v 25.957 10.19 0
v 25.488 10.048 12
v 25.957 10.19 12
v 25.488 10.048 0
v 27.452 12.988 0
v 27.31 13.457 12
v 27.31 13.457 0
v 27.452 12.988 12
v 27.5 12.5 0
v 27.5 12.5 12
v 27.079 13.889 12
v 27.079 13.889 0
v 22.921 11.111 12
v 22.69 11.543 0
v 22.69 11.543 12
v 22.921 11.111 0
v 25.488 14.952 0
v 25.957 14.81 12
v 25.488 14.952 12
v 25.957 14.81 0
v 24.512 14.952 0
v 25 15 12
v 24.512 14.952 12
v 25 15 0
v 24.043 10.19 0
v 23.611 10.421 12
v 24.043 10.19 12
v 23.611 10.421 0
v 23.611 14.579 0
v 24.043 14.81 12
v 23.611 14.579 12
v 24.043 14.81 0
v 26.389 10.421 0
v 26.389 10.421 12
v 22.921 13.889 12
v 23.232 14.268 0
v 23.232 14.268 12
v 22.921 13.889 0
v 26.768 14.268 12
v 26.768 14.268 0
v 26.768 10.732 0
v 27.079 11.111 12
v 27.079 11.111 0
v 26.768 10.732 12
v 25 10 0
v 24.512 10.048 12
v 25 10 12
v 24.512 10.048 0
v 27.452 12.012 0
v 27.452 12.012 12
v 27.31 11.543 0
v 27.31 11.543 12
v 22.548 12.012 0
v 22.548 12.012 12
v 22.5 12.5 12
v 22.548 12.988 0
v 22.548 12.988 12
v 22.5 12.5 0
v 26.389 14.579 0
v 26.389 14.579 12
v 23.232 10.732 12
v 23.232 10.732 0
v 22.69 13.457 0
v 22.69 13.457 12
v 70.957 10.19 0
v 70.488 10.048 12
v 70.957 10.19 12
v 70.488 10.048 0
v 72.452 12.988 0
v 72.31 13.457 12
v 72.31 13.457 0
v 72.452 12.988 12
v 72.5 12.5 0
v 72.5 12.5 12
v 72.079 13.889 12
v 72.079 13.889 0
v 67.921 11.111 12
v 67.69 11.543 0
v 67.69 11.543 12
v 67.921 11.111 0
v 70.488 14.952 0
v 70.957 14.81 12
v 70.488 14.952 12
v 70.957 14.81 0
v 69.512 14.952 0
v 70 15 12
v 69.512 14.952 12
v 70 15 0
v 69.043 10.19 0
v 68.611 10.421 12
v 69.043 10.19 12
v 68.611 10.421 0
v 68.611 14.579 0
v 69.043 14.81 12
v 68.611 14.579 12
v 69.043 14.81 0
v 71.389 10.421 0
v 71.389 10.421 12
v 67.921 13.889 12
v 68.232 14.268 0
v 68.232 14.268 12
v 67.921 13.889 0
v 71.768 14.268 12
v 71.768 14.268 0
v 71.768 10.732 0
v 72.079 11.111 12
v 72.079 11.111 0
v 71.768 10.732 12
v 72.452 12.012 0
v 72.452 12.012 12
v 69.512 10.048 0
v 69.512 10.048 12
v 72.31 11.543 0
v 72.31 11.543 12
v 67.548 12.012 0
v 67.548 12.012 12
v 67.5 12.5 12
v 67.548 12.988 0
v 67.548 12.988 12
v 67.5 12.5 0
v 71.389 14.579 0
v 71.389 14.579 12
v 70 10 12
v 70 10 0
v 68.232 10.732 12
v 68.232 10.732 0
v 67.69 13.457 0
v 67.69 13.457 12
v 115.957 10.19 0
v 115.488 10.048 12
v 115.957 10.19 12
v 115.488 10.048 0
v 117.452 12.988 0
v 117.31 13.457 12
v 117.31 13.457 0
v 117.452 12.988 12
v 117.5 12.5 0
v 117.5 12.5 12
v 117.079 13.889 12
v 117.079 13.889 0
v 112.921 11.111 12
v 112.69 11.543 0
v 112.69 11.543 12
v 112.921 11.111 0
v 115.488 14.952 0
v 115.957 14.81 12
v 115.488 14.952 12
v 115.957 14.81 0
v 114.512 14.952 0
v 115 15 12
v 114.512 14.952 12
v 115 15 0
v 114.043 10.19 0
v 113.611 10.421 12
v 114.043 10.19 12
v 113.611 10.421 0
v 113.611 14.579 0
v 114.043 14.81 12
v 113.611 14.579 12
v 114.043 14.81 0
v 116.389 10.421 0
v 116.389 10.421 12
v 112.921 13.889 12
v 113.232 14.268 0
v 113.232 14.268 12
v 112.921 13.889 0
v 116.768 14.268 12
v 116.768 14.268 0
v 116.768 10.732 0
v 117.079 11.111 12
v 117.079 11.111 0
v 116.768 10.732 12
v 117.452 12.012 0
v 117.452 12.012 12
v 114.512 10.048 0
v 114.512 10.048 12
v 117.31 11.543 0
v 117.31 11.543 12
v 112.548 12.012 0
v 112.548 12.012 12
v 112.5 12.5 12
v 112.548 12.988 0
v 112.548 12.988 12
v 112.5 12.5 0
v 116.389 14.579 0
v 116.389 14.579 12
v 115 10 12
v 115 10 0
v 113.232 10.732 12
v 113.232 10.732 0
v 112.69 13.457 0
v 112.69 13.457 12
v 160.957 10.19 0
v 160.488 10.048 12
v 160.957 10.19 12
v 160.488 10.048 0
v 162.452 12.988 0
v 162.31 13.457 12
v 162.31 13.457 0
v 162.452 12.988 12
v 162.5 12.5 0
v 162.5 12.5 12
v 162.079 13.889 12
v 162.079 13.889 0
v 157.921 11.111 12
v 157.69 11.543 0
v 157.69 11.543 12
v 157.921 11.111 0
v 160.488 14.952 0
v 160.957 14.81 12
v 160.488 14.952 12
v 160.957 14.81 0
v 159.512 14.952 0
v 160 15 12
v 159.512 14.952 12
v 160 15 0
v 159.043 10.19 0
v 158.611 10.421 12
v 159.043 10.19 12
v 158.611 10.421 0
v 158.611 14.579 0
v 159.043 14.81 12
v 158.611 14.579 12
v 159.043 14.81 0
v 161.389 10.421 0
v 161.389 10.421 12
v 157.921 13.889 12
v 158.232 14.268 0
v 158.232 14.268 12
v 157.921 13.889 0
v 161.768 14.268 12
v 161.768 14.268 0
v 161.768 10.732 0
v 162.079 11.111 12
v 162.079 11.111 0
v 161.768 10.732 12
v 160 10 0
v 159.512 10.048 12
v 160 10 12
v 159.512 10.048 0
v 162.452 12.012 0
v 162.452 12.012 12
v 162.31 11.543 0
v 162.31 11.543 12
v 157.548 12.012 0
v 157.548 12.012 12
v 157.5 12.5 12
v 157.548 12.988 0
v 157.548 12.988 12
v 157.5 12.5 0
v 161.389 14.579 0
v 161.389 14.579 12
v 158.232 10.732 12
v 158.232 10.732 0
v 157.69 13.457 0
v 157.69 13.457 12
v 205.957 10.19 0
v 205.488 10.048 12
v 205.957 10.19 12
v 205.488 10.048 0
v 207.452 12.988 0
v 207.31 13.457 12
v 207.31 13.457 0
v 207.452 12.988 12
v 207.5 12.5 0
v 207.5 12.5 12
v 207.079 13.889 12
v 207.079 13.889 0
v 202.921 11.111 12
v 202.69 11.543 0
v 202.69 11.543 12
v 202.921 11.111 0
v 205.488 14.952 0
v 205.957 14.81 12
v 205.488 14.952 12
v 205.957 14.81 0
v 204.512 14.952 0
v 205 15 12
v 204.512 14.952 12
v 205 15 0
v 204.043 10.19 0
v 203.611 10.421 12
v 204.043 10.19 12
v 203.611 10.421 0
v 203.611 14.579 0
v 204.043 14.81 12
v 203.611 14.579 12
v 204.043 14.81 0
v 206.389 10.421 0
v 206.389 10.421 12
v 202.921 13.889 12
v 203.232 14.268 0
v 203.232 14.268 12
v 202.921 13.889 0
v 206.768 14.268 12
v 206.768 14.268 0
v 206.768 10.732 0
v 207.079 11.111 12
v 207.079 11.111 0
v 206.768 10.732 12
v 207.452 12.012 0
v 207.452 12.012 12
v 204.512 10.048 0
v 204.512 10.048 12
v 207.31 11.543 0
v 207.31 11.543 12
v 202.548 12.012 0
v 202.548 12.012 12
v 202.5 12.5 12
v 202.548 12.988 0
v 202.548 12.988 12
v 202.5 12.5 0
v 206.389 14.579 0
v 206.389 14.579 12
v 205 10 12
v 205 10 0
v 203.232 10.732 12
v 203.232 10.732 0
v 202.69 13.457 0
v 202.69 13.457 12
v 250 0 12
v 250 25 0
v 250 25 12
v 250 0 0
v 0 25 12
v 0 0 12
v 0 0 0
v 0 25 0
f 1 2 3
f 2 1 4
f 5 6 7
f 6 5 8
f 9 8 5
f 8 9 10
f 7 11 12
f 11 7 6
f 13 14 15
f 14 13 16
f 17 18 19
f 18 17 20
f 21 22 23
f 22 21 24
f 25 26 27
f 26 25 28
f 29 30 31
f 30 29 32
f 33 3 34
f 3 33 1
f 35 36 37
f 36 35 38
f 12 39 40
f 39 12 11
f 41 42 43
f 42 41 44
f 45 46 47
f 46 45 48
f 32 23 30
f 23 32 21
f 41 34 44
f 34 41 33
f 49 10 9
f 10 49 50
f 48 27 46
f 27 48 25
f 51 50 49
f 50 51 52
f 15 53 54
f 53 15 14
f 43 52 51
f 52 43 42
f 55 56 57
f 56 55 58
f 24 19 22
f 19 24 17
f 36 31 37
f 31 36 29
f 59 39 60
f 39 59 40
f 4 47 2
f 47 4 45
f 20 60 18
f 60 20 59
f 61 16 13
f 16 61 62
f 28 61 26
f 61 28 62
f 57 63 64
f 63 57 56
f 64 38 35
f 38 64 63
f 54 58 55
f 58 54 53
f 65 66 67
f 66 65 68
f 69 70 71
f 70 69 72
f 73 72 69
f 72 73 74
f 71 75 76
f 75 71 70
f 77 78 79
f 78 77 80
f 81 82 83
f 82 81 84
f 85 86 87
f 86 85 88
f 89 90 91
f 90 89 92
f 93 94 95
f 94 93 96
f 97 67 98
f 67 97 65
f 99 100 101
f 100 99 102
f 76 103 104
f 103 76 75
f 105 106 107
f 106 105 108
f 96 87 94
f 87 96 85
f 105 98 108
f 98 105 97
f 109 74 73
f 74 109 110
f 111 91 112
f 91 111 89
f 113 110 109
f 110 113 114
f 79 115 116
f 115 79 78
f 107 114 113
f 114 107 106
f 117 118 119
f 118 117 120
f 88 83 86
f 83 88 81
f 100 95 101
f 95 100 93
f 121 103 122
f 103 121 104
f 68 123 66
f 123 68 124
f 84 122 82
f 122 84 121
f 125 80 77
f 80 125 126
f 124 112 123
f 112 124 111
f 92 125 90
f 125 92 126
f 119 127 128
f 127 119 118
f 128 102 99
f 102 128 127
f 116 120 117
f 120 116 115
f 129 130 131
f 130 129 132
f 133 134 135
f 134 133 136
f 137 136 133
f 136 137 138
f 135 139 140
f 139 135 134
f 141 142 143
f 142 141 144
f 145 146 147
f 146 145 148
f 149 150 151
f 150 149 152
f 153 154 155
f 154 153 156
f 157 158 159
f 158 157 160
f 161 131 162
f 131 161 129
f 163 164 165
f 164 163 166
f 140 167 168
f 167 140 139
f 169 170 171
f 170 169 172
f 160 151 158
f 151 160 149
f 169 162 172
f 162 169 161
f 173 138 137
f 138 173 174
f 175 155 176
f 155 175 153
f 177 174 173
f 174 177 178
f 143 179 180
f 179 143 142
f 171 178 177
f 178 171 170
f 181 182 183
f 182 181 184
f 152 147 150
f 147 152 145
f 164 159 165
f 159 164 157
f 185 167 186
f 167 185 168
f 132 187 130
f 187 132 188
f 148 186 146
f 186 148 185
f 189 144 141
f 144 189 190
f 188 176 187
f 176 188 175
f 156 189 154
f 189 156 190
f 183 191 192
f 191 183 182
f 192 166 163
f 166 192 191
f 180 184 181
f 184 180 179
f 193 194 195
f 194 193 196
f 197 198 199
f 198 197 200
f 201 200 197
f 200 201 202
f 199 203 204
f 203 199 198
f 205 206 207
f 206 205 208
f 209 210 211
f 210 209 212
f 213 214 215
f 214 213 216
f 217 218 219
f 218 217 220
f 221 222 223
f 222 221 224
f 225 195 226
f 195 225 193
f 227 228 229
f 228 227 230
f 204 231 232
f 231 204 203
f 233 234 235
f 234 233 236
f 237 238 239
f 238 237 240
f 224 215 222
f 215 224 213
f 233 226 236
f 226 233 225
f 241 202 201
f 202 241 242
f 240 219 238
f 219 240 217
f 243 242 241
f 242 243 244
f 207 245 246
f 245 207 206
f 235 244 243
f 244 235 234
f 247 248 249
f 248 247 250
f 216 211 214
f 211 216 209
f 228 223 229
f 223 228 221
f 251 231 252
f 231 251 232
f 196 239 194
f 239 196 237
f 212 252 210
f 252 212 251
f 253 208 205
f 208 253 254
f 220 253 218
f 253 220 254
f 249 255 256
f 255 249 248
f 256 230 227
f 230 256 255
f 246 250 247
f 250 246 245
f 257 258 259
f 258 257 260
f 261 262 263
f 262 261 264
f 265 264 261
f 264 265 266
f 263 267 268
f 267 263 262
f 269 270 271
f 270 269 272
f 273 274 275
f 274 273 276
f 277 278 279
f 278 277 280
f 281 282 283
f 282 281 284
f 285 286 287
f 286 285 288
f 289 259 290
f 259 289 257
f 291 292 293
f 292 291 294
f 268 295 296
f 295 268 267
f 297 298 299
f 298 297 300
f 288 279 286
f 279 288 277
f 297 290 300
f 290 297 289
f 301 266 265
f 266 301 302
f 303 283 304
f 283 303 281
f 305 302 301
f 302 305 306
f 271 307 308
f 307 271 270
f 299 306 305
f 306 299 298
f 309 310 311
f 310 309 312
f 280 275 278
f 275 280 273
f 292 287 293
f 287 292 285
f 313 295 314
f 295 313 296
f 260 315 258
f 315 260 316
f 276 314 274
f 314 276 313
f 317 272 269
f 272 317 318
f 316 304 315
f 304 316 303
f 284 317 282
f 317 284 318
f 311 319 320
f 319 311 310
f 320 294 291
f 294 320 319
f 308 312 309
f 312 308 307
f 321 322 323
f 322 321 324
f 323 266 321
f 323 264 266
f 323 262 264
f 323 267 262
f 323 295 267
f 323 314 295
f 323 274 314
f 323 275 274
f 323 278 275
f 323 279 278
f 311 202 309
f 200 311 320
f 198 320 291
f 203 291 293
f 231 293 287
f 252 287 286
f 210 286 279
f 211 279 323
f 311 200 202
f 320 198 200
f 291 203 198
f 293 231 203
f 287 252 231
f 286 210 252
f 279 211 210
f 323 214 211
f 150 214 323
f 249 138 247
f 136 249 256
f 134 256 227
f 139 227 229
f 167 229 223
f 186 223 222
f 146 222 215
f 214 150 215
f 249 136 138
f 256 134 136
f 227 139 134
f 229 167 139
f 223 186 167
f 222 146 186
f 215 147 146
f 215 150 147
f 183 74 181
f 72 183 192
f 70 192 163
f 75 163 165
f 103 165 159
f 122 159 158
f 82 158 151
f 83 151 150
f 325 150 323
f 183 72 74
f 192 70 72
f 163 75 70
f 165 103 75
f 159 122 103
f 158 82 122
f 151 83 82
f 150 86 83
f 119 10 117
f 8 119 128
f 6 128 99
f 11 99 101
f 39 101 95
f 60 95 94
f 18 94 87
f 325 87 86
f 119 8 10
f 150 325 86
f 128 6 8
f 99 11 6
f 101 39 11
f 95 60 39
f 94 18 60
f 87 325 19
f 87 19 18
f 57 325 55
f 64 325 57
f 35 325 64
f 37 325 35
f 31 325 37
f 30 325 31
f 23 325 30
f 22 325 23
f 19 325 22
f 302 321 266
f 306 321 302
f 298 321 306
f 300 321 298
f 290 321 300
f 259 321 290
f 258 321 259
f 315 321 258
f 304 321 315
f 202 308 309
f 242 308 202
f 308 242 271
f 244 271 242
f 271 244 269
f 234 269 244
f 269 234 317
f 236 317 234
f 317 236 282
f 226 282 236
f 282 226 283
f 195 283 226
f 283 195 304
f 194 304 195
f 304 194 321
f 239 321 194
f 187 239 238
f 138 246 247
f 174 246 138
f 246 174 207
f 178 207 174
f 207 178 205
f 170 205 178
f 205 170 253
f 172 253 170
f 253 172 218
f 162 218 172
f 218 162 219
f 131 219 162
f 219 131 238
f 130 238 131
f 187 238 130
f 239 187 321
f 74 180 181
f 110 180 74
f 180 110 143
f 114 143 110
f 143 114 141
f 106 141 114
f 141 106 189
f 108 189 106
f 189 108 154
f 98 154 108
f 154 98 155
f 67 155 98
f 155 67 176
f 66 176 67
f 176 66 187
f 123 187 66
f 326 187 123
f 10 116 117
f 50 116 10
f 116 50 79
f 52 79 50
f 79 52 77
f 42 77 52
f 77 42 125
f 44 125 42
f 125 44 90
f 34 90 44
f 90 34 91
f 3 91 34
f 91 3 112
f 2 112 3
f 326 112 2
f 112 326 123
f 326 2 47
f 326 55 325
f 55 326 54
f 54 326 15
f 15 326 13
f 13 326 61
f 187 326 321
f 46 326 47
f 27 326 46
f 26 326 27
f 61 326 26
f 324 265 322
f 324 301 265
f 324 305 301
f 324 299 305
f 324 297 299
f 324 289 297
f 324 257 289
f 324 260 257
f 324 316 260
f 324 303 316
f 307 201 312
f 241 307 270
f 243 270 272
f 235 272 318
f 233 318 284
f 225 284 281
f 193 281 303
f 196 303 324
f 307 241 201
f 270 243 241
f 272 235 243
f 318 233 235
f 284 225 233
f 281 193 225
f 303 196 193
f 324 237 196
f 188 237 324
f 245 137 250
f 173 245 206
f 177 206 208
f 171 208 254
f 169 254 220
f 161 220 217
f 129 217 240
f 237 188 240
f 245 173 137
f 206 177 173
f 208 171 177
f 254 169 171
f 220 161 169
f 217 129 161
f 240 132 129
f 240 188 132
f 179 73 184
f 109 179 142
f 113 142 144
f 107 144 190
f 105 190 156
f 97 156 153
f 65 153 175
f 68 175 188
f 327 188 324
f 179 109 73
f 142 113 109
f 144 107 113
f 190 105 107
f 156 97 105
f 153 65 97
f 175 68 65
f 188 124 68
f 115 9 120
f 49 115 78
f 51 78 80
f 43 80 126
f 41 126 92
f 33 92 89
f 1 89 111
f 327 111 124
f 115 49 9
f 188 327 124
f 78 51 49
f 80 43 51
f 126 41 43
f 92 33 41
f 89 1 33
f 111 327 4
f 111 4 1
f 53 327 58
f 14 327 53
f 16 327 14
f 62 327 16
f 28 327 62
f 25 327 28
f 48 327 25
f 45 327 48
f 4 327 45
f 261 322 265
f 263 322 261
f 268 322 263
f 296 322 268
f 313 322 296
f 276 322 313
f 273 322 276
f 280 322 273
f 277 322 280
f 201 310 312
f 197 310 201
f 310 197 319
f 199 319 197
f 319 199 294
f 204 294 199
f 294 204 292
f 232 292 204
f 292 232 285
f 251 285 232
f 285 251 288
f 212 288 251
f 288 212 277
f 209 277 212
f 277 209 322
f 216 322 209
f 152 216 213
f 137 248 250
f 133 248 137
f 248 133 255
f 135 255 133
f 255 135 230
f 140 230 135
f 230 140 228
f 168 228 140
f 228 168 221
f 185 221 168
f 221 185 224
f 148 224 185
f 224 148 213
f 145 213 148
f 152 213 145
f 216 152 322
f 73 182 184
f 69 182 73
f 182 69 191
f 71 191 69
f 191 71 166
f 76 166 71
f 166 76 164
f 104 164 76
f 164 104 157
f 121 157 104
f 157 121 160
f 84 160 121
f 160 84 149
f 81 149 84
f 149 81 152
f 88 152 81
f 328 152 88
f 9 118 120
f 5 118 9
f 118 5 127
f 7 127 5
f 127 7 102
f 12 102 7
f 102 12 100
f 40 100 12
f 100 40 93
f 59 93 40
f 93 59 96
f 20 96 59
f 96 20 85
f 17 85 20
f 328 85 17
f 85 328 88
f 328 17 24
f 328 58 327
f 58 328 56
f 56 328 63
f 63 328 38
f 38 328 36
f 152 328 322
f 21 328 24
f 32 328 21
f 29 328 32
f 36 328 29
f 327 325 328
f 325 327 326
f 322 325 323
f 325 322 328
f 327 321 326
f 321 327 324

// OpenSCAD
$fn = 32;

// ----------------------------------------------------------------------
// Long rail: 200-250 mm mounting rail
// ----------------------------------------------------------------------

// --- parameters (mm) ---
rail_l = 250;             // rail length, X
rail_w = 25;              // rail width, Y
rail_t = 12;              // rail thickness, Z
hole_d = 5;               // mounting hole diameter
hole_start = 25;          // first hole offset from the end
hole_pitch = 45;          // hole pitch
holes = 5;                // number of holes

difference() {
  cube([rail_l, rail_w, rail_t]);
  for (i = [0 : holes - 1])
    translate([hole_start + i * hole_pitch, rail_w / 2, -1])
      cylinder(h = rail_t + 2, d = hole_d);
}
